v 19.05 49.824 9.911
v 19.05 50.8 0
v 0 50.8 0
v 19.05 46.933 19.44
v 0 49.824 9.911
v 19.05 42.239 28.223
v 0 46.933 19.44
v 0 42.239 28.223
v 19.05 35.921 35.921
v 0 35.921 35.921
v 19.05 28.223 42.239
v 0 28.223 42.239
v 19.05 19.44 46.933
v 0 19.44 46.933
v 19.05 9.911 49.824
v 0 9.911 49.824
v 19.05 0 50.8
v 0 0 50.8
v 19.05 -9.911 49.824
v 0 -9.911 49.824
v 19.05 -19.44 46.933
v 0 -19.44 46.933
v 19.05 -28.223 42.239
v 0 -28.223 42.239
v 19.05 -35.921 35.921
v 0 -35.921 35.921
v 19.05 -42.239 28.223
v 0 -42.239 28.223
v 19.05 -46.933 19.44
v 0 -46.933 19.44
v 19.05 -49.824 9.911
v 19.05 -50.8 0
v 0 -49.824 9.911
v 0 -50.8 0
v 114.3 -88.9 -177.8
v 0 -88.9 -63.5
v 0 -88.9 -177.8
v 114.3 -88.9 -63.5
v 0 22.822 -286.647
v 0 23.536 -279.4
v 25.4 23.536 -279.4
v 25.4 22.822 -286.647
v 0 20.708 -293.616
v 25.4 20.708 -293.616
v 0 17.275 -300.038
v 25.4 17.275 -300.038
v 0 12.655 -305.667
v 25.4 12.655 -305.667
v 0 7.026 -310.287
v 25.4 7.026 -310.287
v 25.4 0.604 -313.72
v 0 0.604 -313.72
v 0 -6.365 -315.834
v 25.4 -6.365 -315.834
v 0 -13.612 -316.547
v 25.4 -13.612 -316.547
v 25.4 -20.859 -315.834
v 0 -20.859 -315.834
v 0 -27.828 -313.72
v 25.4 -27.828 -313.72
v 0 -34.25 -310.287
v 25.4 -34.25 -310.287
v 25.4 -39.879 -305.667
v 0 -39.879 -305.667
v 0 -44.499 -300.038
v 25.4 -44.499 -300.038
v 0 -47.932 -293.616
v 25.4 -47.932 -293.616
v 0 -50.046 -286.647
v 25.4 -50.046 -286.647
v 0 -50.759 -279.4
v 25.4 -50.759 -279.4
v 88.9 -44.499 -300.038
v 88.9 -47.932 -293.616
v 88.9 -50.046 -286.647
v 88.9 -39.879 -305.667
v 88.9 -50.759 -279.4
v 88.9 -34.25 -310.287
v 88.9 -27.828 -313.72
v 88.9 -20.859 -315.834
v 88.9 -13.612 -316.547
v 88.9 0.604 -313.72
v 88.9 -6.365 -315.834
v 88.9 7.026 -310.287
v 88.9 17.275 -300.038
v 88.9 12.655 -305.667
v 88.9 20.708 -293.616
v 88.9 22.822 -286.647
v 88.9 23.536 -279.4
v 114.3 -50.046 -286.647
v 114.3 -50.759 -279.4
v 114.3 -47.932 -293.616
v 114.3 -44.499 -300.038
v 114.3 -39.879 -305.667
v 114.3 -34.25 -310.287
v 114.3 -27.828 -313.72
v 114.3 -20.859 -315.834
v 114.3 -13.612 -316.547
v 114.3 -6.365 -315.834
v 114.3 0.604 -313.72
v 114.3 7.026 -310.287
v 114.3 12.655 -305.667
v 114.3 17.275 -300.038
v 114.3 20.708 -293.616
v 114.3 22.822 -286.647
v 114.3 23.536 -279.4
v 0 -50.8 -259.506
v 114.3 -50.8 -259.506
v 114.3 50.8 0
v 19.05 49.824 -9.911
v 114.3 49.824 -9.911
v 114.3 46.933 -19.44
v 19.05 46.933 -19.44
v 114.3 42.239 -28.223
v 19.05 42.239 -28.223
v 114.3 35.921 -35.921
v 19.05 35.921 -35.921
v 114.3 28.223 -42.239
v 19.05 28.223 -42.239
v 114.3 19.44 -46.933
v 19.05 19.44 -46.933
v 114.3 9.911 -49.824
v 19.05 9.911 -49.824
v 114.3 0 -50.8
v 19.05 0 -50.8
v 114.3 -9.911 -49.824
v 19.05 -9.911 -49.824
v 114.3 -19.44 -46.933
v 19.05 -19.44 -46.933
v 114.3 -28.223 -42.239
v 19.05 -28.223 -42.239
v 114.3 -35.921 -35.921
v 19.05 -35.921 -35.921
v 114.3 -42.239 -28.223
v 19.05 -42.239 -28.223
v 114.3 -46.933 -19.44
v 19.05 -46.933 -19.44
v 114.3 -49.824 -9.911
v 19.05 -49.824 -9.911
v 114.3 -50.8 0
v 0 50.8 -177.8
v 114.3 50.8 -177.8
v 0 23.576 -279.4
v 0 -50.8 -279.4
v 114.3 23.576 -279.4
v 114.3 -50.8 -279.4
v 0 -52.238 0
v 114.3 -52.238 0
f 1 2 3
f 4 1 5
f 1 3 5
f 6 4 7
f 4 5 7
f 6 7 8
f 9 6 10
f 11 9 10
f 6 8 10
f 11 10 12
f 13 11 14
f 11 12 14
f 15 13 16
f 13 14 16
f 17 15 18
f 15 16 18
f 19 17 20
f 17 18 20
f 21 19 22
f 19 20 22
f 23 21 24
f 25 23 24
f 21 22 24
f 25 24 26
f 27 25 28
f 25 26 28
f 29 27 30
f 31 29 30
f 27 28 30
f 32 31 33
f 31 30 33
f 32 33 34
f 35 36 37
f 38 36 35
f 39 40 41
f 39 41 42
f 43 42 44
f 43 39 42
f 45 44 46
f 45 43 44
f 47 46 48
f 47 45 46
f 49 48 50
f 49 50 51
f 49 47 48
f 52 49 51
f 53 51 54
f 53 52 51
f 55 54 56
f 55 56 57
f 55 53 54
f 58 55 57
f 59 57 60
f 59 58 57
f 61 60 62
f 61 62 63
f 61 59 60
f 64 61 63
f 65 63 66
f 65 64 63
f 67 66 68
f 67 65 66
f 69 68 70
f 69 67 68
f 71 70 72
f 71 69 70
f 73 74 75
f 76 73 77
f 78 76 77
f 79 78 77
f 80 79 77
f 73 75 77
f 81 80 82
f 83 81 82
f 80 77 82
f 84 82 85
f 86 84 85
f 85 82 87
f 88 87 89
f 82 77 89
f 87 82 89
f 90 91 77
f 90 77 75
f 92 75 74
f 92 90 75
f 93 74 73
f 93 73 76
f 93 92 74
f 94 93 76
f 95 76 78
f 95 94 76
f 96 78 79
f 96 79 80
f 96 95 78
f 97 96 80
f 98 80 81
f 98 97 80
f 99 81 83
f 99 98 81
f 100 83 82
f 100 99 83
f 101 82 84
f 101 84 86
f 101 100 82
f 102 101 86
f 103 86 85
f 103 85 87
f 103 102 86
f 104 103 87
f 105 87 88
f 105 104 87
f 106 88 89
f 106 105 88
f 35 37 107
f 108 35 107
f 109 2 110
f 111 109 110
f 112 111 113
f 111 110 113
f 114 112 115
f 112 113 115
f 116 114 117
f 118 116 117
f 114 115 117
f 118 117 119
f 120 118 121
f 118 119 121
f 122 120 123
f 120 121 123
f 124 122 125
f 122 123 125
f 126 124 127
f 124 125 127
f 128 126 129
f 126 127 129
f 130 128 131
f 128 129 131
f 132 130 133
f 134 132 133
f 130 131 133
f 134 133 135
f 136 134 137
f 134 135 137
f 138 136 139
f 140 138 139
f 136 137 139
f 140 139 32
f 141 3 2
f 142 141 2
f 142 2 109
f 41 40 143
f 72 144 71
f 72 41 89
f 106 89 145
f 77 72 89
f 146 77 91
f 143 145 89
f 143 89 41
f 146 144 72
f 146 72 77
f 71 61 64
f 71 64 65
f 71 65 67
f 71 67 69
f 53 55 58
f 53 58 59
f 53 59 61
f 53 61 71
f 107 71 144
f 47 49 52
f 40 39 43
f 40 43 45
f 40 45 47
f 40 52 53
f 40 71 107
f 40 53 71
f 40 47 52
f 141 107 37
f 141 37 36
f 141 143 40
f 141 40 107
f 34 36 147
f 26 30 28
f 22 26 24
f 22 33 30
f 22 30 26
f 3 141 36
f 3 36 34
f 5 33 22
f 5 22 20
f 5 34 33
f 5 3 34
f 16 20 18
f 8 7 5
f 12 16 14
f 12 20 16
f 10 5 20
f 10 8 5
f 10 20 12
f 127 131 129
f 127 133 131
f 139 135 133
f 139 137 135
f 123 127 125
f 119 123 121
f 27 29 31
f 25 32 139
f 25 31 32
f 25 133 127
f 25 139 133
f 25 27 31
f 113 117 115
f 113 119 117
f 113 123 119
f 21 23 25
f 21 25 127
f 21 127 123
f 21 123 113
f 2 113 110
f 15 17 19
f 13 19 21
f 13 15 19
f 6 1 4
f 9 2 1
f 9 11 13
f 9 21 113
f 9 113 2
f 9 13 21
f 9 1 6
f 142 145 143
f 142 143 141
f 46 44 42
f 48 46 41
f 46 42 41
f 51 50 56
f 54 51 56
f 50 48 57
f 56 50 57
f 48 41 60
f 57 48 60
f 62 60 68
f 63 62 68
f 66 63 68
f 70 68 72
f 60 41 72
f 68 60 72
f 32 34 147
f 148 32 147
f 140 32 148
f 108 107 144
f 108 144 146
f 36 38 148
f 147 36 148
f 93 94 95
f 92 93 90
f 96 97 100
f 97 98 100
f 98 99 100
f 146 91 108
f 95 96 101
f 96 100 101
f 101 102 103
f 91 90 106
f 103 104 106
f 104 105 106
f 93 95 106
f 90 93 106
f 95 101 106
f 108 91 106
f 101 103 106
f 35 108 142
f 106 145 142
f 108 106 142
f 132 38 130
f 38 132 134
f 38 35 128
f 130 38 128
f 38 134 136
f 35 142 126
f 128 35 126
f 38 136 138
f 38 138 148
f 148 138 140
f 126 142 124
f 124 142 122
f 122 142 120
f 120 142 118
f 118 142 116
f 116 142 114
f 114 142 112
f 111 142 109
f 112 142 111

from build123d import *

# Parameters (mm, degrees)
F1_DEPTH     = 19.05
F2_DEPTH     = 114.3
F3_W         = 114.3
F3_H         = 101.6
F4_DEPTH     = 177.8
F5_T1_DEPTH  = 641.9538230647
F6_R         = 37.1475
F7_DEPTH     = 25.4
F8_R         = 37.1475
F9_DEPTH     = 25.4
F10_W        = 114.3
F10_H        = 266.7
F11_DEPTH    = 38.1
F12_T4_DEPTH = 574.9754388191
F13_T1_DEPTH = 442.85989084


# Not quite as in the source:
# - a fillet or chamfer that OpenCascade refuses, or shapes differently, is made with other operations: its cross-section is extruded or revolved along the edge and cut away or added


with BuildPart() as f1:
    # F0 (on Right) → F1 (new body)
    with BuildSketch(Plane.YZ):
        with BuildLine():
            Line((-50.8, 0), (50.8, 0))
            ThreePointArc((50.8, 0), (0, 50.8), (-50.8, 0))
        make_face()
        with BuildLine():
            Line((50.8, -101.6), (50.8, 0))
            ThreePointArc((50.8, 0), (0, -50.8), (-50.8, 0))
            Line((-50.8, 0), (-50.8, -101.6))
            Line((-50.8, -101.6), (50.8, -101.6))
        make_face()
        with BuildLine():
            ThreePointArc((-50.8, 0), (0, -50.8), (50.8, 0))
            Line((50.8, 0), (-50.8, 0))
        make_face()
    extrude(amount=F1_DEPTH)

    # F0 (on Right) → F2 (join)
    with BuildSketch(Plane.YZ):
        with BuildLine():
            Line((50.8, -101.6), (50.8, 0))
            ThreePointArc((50.8, 0), (0, -50.8), (-50.8, 0))
            Line((-50.8, 0), (-50.8, -101.6))
            Line((-50.8, -101.6), (50.8, -101.6))
        make_face()
    extrude(amount=F2_DEPTH)

    # F3 (on face) → F4 (join)
    with BuildSketch(Plane(origin=(0, 0, -101.6), x_dir=(1, 0, 0), z_dir=(0, 0, -1))):
        with Locations((57.15, 0)):
            Rectangle(F3_W, F3_H)
    extrude(amount=F4_DEPTH)

    # F5: chamfer of 101.6 x 27.223637951 on 1 edges, made by hand

    # F5_s2 → F5_t1 (cut)
    with BuildSketch(Plane.YZ.offset(-263.8269115324)):
        Polygon((23.576362049, -279.4), (50.8, -177.8), (50.8, -279.4), align=None)
    extrude(amount=F5_T1_DEPTH, mode=Mode.SUBTRACT)

    # F6 (on face) → F7 (join)
    with BuildSketch(Plane(origin=(0, 0, 0), x_dir=(0, -1, 0), z_dir=(-1, 0, 0))):
        with Locations((13.6118189755, -279.4)):
            Circle(F6_R)
    extrude(amount=-F7_DEPTH)

    # F8 (on face) → F9 (join)
    with BuildSketch(Plane.YZ.offset(114.3)):
        with Locations((-13.6118189755, -279.4)):
            Circle(F8_R)
    extrude(amount=-F9_DEPTH)

    # F10 (on face) → F11 (join)
    with BuildSketch(Plane.XZ.offset(50.8)):
        with Locations((57.15, -133.35)):
            Rectangle(F10_W, F10_H)
    extrude(amount=F11_DEPTH)

    # F12: chamfer of 88.9 x 41.45475081 on 1 edges, made by hand


with BuildPart() as f12_tool2:
    # F12_s3 → F12_t4 (new body)
    with BuildSketch(Plane.YZ.offset(-230.3377194096)):
        Polygon((-88.9, -177.8), (-47.44524919, -266.7), (-88.9, -266.7), align=None)
    extrude(amount=F12_T4_DEPTH)

    split(bisect_by=Plane.XZ.offset(50.8), keep=Keep.TOP)


with BuildPart() as f1_1:
    add(f1.part)

    # F12_t1: cut F12_tool2
    add(f12_tool2.part, mode=Mode.SUBTRACT)

    # F13: chamfer of 63.5 x 36.6617420935 on 1 edges, made by hand

    # F13_s2 → F13_t1 (cut)
    with BuildSketch(Plane.YZ.offset(-164.27994542)):
        Polygon((-88.9, -63.5), (-52.2382579065, 0), (-88.9, 0), align=None)
    extrude(amount=F13_T1_DEPTH, mode=Mode.SUBTRACT)


solid = f1_1.part
